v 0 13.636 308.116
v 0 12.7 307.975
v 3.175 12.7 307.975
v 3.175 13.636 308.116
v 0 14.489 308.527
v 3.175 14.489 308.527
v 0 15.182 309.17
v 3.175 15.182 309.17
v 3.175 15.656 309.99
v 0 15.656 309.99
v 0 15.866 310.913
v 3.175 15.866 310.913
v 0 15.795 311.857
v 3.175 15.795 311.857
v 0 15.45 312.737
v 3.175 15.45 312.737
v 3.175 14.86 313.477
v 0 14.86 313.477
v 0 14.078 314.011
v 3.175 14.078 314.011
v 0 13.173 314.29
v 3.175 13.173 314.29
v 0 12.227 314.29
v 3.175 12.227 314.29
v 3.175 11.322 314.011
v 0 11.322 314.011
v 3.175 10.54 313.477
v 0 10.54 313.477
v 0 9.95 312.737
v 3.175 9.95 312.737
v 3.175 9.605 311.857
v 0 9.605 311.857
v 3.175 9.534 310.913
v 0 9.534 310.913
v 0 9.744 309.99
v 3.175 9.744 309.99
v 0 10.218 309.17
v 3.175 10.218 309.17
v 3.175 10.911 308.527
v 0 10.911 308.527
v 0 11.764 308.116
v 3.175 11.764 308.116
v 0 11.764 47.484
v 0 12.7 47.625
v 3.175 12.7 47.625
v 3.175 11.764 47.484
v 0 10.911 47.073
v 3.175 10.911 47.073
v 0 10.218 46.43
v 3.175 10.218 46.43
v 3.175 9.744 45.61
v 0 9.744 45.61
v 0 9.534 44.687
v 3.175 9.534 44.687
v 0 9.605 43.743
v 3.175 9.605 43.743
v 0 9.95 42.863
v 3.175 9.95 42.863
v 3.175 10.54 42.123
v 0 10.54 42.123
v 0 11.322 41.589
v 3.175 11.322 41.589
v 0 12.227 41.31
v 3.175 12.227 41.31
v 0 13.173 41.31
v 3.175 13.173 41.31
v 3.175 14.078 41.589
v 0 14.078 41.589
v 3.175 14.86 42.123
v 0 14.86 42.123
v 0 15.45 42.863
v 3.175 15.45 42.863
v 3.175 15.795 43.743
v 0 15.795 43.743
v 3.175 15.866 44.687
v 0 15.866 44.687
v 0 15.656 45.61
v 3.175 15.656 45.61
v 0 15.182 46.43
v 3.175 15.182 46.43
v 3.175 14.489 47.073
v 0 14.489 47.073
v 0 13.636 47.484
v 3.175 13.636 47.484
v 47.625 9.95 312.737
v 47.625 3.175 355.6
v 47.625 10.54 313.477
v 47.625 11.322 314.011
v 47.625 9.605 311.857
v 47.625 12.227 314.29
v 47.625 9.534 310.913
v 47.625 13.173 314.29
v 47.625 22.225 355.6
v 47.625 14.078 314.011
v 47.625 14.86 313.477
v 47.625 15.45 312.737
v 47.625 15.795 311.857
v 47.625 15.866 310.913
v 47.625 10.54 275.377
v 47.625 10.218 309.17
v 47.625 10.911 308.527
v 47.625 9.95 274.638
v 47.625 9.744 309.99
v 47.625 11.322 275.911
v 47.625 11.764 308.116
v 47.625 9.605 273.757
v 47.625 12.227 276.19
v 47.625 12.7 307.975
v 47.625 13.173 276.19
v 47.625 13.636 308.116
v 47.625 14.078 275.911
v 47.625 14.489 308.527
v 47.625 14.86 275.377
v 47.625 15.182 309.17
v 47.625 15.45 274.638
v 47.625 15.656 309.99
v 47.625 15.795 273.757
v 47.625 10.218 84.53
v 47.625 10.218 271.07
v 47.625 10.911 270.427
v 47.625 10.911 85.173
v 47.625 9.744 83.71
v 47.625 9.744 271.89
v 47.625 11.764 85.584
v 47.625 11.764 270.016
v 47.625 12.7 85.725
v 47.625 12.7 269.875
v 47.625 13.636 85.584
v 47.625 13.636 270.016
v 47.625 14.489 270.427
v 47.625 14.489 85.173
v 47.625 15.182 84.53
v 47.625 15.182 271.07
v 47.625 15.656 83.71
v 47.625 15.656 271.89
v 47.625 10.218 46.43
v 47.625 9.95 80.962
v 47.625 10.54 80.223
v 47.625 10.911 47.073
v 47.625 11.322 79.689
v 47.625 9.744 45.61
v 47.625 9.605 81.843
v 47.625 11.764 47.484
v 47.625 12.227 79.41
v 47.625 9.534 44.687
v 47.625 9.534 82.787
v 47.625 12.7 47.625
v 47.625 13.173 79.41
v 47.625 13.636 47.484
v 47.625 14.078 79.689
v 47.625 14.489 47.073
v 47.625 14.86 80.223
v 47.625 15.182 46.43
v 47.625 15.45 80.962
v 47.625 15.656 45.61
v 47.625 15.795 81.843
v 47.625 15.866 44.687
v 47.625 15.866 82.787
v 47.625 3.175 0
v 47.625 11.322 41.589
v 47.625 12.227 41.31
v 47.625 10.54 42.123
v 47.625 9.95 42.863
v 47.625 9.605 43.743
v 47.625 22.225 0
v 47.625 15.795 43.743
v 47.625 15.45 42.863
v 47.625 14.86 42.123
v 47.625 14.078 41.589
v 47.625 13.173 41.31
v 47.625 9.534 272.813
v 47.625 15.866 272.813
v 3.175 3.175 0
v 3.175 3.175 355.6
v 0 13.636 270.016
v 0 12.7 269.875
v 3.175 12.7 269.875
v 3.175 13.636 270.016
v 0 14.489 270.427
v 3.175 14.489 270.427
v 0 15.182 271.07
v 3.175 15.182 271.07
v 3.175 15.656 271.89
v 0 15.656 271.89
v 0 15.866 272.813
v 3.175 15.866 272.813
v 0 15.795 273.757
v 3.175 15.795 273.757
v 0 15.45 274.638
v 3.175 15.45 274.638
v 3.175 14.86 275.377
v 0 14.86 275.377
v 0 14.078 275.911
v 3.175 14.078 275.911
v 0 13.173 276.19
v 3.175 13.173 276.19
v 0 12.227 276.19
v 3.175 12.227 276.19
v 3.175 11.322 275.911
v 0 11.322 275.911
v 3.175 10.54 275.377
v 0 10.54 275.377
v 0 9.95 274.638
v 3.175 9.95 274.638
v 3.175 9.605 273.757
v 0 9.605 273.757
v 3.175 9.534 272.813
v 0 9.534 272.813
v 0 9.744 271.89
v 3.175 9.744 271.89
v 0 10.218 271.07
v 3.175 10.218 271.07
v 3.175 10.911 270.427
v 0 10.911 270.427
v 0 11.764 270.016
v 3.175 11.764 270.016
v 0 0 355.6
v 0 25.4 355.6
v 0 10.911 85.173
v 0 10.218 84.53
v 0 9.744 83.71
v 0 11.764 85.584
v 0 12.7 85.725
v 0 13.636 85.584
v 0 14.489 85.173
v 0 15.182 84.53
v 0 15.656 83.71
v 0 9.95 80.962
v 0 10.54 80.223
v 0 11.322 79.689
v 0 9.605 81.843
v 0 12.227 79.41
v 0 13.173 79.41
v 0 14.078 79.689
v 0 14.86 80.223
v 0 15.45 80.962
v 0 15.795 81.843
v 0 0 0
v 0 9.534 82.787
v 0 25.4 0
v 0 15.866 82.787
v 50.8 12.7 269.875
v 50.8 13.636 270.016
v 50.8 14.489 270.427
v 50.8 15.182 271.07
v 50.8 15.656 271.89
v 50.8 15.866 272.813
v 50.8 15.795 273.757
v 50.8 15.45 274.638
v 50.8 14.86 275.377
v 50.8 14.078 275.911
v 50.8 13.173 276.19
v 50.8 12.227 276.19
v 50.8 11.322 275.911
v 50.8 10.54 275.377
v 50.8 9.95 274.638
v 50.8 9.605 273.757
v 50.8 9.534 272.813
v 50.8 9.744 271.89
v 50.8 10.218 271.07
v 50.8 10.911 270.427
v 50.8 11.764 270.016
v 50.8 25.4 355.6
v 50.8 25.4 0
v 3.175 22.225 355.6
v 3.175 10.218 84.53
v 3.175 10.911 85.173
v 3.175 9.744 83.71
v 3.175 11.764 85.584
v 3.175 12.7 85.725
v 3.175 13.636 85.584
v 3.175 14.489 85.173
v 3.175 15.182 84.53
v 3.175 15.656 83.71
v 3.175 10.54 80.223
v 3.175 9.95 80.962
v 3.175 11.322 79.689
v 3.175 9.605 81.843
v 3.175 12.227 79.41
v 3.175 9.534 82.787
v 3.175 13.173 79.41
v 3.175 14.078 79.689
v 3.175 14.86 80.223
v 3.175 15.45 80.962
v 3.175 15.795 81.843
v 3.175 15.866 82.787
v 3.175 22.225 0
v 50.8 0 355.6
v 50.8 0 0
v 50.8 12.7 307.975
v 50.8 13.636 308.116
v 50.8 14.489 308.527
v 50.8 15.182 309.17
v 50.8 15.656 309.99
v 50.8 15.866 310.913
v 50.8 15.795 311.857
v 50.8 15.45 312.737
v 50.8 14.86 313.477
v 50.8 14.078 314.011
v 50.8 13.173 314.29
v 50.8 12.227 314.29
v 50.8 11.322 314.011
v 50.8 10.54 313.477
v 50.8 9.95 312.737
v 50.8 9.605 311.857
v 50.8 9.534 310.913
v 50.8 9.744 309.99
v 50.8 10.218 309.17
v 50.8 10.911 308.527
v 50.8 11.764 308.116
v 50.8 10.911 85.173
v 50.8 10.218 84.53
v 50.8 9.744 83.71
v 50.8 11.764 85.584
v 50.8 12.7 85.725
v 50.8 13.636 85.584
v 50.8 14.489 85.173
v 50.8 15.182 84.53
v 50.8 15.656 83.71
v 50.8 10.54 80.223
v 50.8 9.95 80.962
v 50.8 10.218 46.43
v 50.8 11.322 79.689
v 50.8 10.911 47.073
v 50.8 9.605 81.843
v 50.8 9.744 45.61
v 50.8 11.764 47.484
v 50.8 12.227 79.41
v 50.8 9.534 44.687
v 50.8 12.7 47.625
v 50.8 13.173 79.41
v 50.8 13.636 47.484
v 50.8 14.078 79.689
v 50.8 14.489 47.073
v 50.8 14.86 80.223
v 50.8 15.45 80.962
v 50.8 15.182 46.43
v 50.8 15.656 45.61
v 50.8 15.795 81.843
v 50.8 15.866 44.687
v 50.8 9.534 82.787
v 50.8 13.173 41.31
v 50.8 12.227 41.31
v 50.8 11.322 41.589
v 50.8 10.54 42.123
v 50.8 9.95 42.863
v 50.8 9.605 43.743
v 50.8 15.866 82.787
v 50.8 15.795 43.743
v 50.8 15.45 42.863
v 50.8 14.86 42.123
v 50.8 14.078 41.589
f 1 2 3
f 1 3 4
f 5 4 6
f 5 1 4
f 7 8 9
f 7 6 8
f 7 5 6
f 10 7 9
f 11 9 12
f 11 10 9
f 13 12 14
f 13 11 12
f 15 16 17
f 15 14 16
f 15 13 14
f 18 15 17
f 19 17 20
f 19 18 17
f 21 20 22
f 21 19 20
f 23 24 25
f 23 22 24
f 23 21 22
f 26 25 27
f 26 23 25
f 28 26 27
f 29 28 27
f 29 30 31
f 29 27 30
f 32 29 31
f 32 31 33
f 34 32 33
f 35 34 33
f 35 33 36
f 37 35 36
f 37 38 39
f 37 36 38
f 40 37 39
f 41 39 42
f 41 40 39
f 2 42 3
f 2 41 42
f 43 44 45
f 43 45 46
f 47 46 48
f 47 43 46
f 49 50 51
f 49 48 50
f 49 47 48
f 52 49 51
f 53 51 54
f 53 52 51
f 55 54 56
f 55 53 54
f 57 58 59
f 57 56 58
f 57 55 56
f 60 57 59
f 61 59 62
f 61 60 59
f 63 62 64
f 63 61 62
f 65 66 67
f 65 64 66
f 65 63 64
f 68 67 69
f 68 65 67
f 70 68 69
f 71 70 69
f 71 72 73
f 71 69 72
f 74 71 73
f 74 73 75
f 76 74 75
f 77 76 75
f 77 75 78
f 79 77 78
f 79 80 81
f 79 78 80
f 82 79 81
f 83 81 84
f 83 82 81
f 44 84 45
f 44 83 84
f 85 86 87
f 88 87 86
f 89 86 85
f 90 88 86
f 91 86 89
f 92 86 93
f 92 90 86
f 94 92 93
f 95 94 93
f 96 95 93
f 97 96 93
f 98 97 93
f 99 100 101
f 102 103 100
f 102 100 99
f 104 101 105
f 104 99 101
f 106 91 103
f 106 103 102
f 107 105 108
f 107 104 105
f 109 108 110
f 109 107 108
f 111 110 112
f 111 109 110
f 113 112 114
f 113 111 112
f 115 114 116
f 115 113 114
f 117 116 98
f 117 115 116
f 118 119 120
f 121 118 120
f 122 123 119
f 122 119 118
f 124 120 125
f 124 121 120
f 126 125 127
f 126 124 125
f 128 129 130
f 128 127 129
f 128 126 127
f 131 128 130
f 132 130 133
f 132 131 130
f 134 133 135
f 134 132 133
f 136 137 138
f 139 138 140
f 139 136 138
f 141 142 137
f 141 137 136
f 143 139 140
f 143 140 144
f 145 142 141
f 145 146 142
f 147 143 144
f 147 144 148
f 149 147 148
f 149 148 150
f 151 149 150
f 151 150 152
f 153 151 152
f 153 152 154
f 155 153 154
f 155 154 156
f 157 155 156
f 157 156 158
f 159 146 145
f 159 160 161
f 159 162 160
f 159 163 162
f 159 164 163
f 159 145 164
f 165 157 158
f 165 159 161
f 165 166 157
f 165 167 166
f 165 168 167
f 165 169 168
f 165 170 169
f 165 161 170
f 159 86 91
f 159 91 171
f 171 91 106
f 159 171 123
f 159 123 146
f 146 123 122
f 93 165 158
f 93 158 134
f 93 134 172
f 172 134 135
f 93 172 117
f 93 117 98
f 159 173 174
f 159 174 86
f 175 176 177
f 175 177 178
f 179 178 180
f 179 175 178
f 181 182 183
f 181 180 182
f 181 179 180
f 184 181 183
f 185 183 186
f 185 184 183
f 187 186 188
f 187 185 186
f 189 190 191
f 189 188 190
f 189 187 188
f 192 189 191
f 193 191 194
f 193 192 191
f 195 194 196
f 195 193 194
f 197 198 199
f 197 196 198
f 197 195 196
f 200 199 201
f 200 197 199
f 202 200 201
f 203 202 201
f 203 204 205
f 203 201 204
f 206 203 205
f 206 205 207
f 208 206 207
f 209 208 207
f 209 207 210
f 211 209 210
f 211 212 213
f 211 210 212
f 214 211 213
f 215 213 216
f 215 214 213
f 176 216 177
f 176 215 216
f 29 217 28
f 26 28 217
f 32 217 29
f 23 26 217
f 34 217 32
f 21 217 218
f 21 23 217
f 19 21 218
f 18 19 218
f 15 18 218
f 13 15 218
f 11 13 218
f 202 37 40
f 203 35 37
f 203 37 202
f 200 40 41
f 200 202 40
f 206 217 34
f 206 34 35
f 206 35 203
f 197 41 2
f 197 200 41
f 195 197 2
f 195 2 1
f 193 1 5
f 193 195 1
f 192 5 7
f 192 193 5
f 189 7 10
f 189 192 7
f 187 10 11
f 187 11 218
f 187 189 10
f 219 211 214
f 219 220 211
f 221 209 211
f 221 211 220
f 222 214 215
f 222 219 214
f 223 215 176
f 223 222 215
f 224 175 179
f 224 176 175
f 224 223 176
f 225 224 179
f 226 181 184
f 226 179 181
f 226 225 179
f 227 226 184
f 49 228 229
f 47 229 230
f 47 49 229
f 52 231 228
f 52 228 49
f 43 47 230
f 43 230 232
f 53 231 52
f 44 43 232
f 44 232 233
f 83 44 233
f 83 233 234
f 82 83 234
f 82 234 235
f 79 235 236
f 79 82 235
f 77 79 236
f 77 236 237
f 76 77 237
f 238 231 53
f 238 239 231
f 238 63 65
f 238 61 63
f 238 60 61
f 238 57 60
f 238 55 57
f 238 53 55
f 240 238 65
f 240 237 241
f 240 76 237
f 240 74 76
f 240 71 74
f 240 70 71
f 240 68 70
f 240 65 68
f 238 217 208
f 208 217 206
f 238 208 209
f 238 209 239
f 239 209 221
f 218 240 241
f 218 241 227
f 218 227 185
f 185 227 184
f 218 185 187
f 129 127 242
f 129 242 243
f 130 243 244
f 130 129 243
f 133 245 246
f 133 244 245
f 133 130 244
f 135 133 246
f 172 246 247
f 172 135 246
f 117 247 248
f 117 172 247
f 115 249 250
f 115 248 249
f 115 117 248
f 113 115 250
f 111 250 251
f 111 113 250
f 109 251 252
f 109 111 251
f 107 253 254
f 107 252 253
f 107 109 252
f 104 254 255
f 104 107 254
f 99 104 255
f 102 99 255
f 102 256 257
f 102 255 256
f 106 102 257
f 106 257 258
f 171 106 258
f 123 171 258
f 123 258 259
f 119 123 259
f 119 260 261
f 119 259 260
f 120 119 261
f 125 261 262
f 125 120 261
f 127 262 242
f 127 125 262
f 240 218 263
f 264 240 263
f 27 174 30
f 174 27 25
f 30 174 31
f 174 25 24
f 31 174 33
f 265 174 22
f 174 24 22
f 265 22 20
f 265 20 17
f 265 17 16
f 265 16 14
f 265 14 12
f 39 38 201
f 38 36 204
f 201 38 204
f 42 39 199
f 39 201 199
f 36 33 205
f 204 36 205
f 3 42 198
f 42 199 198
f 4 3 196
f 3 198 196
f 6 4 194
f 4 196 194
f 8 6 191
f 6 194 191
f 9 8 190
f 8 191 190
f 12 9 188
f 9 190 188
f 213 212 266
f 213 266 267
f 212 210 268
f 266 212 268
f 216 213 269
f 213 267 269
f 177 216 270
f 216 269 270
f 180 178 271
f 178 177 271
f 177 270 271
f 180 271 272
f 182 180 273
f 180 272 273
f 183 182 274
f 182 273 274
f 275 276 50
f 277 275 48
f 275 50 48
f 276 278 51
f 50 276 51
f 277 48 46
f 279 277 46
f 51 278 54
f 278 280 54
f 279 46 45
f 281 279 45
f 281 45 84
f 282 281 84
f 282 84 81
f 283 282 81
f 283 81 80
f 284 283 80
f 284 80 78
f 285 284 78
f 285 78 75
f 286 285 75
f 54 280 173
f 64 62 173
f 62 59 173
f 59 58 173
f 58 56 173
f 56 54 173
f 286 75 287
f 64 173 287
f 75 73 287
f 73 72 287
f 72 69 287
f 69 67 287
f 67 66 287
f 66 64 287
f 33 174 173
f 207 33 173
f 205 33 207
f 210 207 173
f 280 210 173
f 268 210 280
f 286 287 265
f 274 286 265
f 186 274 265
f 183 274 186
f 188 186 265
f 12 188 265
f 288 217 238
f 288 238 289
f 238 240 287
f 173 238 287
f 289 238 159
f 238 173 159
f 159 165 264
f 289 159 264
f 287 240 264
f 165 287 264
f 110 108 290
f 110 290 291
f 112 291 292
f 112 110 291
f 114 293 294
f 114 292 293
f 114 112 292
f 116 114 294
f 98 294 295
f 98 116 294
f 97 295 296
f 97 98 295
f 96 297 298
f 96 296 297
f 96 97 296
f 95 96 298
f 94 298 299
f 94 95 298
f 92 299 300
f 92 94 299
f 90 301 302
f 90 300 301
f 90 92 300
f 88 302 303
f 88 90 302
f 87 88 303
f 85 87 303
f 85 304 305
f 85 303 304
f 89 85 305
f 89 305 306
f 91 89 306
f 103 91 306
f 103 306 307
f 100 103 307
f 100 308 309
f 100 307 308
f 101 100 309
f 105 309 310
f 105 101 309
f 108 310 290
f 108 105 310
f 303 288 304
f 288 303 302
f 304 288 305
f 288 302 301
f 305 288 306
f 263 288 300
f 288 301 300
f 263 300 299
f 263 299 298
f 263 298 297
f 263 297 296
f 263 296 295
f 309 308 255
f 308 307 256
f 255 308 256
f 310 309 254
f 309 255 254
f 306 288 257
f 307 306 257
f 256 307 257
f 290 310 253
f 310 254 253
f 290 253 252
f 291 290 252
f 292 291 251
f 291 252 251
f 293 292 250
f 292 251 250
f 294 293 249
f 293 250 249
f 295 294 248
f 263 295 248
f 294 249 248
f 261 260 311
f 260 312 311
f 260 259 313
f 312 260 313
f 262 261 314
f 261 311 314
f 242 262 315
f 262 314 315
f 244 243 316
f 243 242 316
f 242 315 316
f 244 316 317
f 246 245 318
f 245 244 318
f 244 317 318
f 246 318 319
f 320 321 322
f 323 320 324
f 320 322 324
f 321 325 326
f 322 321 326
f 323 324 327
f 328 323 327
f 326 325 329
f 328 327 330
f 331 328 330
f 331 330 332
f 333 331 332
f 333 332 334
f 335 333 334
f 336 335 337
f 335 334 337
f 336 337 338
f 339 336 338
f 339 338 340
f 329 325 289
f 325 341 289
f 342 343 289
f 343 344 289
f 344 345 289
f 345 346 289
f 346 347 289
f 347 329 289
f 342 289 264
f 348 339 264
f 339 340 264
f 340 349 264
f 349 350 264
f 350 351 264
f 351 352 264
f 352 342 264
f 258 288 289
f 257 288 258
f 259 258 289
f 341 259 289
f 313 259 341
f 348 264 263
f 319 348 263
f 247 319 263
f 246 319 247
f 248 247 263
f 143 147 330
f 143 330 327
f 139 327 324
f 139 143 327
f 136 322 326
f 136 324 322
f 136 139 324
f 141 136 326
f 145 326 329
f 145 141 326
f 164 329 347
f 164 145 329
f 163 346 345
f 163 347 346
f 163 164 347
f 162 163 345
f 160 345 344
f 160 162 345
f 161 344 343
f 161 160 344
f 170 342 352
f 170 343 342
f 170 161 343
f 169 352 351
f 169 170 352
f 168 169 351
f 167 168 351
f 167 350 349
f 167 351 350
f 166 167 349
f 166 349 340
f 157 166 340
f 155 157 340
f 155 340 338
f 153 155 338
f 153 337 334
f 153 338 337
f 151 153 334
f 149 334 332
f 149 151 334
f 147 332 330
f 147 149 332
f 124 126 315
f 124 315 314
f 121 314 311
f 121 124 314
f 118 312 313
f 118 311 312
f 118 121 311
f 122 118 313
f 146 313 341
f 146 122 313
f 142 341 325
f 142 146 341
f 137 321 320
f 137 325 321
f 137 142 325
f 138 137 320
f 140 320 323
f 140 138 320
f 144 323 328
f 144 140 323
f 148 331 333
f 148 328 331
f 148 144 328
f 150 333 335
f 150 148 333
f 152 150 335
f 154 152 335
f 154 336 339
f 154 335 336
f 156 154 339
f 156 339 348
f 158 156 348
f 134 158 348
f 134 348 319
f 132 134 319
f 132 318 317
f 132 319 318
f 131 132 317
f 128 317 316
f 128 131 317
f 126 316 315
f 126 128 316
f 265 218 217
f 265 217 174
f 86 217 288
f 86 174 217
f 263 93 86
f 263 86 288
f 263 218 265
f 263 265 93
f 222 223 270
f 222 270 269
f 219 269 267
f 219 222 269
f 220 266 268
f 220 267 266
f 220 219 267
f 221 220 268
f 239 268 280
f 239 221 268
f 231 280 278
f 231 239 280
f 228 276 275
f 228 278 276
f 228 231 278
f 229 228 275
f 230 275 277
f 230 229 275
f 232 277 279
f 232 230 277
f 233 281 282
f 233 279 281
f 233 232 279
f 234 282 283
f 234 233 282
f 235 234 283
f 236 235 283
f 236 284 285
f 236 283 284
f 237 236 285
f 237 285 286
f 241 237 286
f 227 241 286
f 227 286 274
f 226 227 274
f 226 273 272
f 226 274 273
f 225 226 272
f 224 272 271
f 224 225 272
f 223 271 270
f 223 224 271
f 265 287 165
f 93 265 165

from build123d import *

# Parameters (mm, degrees)
SKETCH1_W               = 50.8
SKETCH1_H               = 25.4
SKETCH1_W_2             = 44.45
SKETCH1_H_2             = 19.05
BOSS_EXTRUDE1_DEPTH     = 355.6
CUT_EXTRUDE1_DEPTH      = 361.10715072
CUT_EXTRUDE1_DEPTH_BACK = 361.10715072
SKETCH2_R               = 3.175


with BuildPart() as part:
    # Sketch1 → Boss-Extrude1 (new body)
    with BuildSketch(Plane.XY):
        with Locations((25.4, 12.7)):
            Rectangle(SKETCH1_W, SKETCH1_H)
        with Locations((25.4, 12.7)):
            Rectangle(SKETCH1_W_2, SKETCH1_H_2, mode=Mode.SUBTRACT)
    extrude(amount=BOSS_EXTRUDE1_DEPTH)

    # Sketch2 → Cut-Extrude1 (cut, two sides: drawn at the far end of the back side and taken through both)
    with BuildSketch(Plane(origin=(50.8, 0, 0), x_dir=(0, 0, -1), z_dir=(1, 0, 0)).offset(-CUT_EXTRUDE1_DEPTH_BACK)):
        with Locations((-273.05, 12.7)):
            Circle(SKETCH2_R)
        with Locations((-311.15, 12.7)):
            Circle(SKETCH2_R)
        with Locations(Location((-44.45, 12.7, 0), (0, 0, 180))):
            Circle(SKETCH2_R)
        with Locations(Location((-82.55, 12.7, 0), (0, 0, 180))):
            Circle(SKETCH2_R)
    extrude(amount=CUT_EXTRUDE1_DEPTH + CUT_EXTRUDE1_DEPTH_BACK, mode=Mode.SUBTRACT)


solid = part.part
